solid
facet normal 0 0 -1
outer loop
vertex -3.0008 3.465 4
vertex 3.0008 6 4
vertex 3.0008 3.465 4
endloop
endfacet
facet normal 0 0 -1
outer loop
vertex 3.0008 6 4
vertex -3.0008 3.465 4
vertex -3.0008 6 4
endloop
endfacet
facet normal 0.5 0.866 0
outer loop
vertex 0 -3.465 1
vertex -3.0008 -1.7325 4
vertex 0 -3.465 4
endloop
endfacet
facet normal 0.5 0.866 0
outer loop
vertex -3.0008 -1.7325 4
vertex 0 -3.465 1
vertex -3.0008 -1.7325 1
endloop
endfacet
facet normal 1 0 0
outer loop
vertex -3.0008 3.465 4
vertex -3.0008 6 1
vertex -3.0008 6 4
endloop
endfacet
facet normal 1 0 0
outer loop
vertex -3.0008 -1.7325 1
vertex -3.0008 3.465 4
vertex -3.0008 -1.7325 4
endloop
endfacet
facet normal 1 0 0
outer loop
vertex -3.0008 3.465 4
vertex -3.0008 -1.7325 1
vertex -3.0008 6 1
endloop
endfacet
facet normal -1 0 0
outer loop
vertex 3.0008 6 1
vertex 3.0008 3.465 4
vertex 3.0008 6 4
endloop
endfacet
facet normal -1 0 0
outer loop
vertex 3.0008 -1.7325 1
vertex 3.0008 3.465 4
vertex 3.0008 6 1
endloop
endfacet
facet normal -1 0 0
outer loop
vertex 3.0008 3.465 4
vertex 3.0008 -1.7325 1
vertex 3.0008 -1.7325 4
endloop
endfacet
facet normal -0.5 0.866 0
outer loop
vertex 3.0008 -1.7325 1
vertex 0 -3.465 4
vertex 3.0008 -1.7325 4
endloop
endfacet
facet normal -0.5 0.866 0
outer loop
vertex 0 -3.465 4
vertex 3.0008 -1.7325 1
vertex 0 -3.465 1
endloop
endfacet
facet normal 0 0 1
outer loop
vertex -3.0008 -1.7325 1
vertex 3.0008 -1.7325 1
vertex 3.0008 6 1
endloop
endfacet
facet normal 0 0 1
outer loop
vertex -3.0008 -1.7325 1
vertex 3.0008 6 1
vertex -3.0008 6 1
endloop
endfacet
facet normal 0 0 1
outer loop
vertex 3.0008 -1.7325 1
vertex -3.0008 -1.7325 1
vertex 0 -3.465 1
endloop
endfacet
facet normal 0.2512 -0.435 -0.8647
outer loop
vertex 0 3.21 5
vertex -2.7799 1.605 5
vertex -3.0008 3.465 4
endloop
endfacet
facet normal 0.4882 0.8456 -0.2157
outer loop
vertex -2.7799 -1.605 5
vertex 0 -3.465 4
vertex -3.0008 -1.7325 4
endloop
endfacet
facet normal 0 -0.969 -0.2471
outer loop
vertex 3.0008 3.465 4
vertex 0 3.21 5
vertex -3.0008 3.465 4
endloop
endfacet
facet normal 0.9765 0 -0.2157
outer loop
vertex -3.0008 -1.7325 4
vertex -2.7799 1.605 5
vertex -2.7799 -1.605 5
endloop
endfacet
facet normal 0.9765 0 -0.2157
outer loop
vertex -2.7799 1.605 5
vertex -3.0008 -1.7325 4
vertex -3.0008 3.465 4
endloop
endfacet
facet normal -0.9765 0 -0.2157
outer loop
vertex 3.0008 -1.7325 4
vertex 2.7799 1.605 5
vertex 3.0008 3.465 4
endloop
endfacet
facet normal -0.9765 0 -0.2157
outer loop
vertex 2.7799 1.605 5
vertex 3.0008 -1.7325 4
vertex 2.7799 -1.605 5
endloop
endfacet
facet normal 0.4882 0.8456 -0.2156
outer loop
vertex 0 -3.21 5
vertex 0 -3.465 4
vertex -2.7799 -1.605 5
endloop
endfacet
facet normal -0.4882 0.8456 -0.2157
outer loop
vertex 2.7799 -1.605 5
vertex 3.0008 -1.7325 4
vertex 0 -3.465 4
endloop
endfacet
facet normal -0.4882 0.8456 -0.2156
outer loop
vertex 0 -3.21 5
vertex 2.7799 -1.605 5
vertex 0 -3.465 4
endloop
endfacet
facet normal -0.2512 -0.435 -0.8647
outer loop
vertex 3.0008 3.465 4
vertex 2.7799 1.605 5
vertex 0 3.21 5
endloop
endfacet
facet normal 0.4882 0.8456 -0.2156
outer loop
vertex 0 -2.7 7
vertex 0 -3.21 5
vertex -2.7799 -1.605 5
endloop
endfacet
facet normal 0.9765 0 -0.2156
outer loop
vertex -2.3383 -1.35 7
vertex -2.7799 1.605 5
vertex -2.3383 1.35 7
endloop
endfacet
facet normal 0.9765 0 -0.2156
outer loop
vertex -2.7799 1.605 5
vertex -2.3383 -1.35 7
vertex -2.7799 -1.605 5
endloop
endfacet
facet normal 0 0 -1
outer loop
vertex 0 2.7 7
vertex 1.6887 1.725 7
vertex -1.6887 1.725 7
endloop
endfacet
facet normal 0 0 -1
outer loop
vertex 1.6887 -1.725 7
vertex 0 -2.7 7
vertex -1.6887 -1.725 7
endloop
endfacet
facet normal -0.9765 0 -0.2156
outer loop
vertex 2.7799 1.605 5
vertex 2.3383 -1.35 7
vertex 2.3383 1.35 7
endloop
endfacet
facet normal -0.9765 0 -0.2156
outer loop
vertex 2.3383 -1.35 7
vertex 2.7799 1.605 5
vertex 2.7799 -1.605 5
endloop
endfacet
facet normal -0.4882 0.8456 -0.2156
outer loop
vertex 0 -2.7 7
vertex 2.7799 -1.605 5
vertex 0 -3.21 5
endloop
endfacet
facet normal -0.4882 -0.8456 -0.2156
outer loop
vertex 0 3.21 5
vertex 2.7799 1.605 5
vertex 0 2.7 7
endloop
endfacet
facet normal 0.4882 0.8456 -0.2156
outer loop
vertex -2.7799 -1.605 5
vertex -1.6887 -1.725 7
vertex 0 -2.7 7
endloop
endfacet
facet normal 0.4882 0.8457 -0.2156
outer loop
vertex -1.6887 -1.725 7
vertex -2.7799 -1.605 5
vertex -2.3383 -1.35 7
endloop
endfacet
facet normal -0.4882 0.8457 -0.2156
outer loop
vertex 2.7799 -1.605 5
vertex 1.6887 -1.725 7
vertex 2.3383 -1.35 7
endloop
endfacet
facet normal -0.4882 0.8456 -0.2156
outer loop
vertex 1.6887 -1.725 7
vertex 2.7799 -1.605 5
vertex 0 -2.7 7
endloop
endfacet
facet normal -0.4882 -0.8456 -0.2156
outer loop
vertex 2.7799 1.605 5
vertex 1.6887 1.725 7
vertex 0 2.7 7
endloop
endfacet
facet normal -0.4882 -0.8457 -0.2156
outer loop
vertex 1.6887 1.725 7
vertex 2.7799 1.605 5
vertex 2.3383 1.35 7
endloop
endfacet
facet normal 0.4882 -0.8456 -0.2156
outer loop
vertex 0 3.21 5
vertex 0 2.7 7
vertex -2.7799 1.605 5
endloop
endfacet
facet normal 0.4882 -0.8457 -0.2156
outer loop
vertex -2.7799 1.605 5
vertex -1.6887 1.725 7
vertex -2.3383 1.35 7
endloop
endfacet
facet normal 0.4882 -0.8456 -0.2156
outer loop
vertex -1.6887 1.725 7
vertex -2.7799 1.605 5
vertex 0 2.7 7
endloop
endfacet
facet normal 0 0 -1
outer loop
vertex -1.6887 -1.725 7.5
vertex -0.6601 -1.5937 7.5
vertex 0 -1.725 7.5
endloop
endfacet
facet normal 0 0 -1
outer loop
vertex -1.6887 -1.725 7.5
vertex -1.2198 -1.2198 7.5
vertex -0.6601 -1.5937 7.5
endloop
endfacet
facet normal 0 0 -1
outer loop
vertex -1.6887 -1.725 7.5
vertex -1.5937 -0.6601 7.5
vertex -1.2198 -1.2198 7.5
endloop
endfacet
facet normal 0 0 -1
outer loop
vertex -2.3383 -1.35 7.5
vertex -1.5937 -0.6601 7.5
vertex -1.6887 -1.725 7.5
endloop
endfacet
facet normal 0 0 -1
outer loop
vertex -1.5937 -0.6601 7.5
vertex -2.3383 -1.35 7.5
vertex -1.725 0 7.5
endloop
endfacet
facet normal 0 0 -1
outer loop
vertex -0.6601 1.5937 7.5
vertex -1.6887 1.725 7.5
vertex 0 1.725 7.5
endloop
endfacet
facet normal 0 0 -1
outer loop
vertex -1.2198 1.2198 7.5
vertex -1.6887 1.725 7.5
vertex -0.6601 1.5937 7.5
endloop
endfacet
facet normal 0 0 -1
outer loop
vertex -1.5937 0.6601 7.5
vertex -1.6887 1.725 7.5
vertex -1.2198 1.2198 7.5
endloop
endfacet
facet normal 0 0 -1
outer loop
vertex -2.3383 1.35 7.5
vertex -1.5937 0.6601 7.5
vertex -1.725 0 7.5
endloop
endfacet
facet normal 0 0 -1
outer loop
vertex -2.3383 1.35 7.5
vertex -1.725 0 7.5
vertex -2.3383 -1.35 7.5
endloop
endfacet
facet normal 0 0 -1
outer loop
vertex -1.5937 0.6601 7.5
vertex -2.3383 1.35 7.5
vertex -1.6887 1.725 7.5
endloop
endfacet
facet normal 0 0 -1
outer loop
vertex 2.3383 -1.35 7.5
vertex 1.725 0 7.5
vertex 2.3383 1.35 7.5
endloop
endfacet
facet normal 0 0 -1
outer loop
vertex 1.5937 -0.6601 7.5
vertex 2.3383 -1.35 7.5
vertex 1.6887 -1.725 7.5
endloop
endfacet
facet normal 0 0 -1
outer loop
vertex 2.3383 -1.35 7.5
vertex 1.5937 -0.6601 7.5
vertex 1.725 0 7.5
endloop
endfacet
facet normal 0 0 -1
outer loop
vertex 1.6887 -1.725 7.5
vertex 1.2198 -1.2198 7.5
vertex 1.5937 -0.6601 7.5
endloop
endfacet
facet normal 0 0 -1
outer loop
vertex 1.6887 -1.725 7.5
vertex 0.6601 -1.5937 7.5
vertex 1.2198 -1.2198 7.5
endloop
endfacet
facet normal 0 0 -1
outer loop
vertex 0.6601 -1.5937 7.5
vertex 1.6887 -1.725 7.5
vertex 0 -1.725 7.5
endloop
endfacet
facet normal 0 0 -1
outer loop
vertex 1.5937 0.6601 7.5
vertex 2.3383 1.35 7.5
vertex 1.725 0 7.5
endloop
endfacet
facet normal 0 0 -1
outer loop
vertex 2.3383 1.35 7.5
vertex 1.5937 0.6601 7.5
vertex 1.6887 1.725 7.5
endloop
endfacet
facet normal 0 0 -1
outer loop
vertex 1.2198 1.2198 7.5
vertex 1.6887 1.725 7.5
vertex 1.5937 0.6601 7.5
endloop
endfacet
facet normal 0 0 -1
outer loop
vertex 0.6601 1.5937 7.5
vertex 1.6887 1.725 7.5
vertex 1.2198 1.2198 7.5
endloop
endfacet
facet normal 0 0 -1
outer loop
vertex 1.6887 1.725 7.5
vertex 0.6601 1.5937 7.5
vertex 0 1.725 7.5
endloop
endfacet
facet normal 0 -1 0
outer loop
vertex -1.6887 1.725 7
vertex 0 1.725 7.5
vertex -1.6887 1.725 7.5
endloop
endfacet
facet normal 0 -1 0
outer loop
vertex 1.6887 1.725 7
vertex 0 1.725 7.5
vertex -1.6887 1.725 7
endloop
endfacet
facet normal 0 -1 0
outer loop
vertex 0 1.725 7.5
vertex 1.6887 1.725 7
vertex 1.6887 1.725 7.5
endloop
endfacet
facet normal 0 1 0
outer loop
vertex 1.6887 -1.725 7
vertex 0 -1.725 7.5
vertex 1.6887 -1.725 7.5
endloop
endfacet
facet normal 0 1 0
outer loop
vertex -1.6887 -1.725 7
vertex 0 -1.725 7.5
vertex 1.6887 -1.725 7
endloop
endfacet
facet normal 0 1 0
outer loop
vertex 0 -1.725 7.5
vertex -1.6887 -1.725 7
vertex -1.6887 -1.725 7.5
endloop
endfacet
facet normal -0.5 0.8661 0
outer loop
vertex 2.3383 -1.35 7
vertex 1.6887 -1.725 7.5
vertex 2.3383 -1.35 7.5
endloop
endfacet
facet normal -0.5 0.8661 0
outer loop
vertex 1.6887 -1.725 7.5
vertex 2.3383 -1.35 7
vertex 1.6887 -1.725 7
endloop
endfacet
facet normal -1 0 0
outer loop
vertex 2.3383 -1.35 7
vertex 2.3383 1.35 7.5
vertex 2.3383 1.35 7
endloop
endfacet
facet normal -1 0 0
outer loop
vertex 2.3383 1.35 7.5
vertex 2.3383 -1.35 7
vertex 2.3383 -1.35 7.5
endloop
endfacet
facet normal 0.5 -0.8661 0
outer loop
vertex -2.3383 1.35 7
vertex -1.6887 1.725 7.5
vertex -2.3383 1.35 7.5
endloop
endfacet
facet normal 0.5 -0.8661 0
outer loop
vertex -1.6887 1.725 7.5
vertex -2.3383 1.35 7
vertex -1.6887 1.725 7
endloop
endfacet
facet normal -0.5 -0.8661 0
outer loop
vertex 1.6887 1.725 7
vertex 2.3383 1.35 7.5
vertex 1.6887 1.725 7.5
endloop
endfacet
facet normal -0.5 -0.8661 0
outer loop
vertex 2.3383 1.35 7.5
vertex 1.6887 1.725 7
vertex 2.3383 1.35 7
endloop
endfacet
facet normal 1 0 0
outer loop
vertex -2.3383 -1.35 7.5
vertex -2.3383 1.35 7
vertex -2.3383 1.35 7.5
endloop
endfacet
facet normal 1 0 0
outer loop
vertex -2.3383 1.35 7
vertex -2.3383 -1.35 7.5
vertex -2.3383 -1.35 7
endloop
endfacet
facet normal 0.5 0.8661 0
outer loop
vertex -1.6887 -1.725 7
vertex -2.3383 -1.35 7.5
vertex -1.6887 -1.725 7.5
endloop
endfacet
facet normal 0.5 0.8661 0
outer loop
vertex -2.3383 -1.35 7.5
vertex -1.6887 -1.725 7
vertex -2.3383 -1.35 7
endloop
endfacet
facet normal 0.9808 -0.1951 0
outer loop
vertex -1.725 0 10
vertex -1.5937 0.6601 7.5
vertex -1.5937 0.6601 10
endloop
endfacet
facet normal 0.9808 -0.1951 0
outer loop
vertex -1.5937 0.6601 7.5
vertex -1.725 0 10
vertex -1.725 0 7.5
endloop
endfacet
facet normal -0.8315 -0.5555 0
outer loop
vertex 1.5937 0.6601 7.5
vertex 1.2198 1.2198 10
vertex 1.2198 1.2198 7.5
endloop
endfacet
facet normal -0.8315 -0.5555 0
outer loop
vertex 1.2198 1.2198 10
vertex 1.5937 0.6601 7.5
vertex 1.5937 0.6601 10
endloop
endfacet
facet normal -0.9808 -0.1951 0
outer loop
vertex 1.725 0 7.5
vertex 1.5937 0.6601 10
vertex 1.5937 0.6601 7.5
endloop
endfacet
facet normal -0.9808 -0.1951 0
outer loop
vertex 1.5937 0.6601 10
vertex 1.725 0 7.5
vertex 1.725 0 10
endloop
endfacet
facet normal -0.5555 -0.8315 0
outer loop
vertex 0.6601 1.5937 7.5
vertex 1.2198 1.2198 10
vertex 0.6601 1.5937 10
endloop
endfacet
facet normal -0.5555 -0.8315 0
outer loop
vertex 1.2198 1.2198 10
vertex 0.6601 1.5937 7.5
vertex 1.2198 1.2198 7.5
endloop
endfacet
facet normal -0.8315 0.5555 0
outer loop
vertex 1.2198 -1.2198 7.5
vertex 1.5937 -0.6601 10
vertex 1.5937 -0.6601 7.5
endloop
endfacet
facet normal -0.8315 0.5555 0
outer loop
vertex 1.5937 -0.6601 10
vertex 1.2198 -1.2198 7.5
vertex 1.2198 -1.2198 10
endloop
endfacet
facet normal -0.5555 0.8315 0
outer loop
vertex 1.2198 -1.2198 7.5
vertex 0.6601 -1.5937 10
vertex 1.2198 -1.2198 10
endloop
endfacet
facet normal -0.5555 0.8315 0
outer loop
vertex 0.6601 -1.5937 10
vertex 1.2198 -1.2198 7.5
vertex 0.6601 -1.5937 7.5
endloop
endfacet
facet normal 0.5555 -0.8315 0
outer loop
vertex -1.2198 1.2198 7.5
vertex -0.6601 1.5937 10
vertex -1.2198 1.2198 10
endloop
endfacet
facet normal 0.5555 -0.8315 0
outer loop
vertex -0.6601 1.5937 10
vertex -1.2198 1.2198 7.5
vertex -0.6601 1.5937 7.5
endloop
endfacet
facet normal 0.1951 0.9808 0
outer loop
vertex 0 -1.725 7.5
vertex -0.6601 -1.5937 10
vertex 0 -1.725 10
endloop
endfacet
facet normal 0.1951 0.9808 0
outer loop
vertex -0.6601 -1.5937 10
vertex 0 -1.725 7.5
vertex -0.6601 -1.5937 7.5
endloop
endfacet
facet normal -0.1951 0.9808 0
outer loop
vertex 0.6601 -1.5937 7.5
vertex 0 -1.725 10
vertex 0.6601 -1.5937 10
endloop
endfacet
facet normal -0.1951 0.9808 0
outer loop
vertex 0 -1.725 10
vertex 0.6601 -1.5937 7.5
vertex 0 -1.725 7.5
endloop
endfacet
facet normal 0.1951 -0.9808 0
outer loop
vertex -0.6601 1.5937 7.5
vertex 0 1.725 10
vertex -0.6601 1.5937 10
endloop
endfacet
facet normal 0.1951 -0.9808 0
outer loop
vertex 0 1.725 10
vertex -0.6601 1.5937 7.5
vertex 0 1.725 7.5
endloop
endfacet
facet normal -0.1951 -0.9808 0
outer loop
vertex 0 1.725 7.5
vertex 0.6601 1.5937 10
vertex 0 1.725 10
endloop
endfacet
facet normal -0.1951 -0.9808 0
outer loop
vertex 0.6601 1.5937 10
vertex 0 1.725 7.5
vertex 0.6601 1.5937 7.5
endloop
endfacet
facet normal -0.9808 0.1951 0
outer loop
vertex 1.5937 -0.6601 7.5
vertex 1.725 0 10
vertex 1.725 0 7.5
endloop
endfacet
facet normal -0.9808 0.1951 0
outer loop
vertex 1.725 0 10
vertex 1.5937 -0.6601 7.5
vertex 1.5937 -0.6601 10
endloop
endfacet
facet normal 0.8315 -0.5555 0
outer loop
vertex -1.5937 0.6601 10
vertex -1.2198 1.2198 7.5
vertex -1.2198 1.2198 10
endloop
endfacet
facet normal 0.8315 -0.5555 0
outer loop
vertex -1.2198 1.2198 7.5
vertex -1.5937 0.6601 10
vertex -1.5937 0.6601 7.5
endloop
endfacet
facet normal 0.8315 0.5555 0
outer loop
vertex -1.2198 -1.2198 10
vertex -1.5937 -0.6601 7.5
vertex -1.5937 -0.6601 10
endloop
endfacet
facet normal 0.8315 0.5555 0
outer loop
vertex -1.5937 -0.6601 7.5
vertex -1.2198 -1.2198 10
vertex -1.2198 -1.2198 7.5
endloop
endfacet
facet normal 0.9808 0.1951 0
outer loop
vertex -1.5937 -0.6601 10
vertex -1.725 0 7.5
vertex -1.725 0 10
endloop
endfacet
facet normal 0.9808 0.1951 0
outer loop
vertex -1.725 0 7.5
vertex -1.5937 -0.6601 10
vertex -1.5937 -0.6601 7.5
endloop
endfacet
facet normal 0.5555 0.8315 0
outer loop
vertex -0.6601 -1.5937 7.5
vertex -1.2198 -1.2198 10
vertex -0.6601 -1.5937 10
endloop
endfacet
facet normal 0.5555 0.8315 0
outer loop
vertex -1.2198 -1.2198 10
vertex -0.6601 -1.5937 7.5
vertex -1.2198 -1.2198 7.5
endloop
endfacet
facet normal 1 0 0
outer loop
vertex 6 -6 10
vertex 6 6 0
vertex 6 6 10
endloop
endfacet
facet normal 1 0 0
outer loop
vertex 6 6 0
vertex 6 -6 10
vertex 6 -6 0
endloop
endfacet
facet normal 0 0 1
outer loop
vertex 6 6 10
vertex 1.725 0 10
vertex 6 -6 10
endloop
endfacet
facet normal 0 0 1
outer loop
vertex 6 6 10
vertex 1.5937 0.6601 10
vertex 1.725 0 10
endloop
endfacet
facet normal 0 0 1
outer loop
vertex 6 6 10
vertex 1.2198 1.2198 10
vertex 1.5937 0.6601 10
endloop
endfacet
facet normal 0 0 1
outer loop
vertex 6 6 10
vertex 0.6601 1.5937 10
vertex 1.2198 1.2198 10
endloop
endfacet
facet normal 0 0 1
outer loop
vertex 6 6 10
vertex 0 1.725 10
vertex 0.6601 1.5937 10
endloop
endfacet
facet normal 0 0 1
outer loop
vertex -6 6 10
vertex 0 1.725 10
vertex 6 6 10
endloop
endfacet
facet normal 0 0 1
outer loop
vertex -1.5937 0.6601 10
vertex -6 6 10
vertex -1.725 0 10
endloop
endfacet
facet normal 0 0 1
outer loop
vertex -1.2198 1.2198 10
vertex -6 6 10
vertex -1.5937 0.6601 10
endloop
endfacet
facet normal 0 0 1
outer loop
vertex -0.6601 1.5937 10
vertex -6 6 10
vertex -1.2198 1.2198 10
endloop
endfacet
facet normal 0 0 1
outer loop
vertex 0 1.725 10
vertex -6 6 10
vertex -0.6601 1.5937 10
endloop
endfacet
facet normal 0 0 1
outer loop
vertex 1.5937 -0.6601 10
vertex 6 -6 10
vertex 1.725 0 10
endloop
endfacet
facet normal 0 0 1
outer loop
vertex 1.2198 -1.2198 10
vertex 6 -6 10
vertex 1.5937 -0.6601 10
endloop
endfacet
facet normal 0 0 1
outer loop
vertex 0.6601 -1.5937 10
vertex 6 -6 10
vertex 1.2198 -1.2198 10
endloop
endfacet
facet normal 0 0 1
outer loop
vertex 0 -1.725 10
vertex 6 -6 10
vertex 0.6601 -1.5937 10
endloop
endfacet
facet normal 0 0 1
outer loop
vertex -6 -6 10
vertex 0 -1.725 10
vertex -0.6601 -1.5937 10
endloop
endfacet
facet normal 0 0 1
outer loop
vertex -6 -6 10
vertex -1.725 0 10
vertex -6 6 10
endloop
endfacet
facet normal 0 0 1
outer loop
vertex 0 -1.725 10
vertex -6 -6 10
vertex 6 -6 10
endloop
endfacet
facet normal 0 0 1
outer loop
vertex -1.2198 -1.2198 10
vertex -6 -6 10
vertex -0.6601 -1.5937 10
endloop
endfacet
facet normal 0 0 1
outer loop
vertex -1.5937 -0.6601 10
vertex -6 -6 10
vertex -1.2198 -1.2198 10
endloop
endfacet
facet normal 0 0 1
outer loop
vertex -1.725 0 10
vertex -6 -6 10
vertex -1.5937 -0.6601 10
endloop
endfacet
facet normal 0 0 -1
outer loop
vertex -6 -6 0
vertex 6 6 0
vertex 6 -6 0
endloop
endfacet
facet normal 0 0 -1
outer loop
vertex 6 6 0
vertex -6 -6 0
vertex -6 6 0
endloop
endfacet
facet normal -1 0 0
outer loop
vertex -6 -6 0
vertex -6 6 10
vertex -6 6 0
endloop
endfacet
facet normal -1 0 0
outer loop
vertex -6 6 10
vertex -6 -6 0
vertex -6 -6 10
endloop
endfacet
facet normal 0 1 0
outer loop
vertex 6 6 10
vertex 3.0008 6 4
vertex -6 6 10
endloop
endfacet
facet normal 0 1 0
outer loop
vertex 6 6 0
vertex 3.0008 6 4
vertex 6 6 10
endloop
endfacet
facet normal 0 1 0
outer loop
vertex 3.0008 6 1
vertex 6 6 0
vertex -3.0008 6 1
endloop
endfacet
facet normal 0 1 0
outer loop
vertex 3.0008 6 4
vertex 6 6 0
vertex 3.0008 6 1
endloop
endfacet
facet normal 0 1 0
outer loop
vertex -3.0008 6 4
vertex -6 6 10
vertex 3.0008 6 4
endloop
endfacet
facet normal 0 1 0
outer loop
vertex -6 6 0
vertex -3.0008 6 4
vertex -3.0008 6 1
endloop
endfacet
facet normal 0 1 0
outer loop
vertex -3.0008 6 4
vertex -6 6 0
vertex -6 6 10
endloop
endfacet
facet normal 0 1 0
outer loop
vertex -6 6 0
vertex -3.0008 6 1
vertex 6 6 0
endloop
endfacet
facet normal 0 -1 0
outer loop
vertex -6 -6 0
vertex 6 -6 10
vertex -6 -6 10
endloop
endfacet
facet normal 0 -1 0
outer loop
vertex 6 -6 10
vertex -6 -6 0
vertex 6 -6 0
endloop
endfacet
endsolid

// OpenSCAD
// file: microscope_parameters.scad
/******************************************************************
*                                                                 *
* OpenFlexure Microscope: Microscope Parameters                   *
*                                                                 *
* This is the top-level configuration file for the OpenFlexure    *
* microscope, an open microscope and 3-axis translation stage.    *
* It gets really good precision over a ~10mm range, by using      *
* plastic flexure mechanisms.                                     *
*                                                                 *
* Generally I've tried to put parts (or collections of closely    *
* related parts) in their own files.  However, all the parts      *
* depend on the geometry of the microscope - so these parameters  *
* are gathered together here.  In general, the ones you might     *
* to change are towards the top!  Lower-down ones are defined in  *
* terms of higher-up ones - confusion might arise if you redefine *
* these later...                                                  *
*                                                                 *
* (c) Richard Bowman, January 2016                                *
* Released under the CERN Open Hardware License                   *
*                                                                 *
* http://www.github.com/rwb27/openflexure_microscope              *
* http://www.docubricks.com/projects/openflexure-microscope       *
* http://www.waterscope.org                                       *
*                                                                 *
******************************************************************/

// this is a tiny distance. Used to be a parameter d in the code but that caused confusion with diameters
function tiny() = 0.05;
$fn=32;

// These are the most useful parameters to change!
motor_lugs = true;
version_numstring = "6.1.3";
camera = "picamera_2"; //see cameras/camera.scad for valid values
optics = "rms_f50d13"; //see optics.scad for valid values
led_r = 4.5/2; //size of the LED used for illumination
endstops = false; //whether to build mounts for optical endstops inside the microscope.
feet_endstops = false; //whether to include cut-outs for endstop switches in the feet.
beamsplitter = true; //enables a cut-out in some optics modules for a beamsplitter
smart_brim_r = 5;
enable_smart_brim = true;

// This sets the basic geometry of the microscope
sample_z = 75; // z position of sample
leg_height = sample_z-10; // height of the top of the leg. Shorter by 10 to give space to insert nuts.

leg_r = 30; // radius on which the innermost part of legs sit. (This sets the stage size)
hole_r = 20; // size of hole in the stage
xy_lever_ratio = 4.0/7.0; // mechanical advantage of actuator over stage - can be used to trade speed and precision
z_lever_ratio = 1.0; // as above, for Z axis (must be >1)

// The variables below affect the position of the objective mount
z_strut_l = 18; //length of struts supporting Z carriage
objective_mount_y = 18; // y position of clip for optics
objective_mount_nose_w = 6; // width of the pointy end of the mount
condenser_clip_w = 14; // width of the dovetail clip for the condenser
foot_height=15;

// This variables set the dimensions of flexures.
// It is well tested with PLA.

function flex_dims() = let
(
    flex_w = 4, // width  of flexures
    flex_l = 1.5,    // length of flexures
    flex_t = 0.75// thickness  of flexures
)  [flex_w, flex_l, flex_t];

flex_a = 0.15;    // sin(8.62 deg) => sine of the angle through which flexures can be bent

// Compile a sensible version string
version_string = str("v",version_numstring, sample_z, motor_lugs?"-M":"");
echo(str("Compiling OpenFlexure Microscope ",version_string));


leg_block_t = 5; // Thickness of the block at the top and bottom of the leg
stage_t = sample_z-leg_height + leg_block_t; //thickness of the XY stage (at thickest point, most is 1mm less)
stage_hole_inset = flex_dims().y+4; // how far the holes on the XY stage are inset from leg_r
flex_z1 = 0;      // z position of lower flexures for XY axis
flex_z2 = leg_height-leg_block_t; //height of upper XY flexures
z_strut_t = 6;  // (z) thickness of struts for Z axis
function leg_dims() = [4,flex_dims().x,flex_z2+flex_dims().z]; // size of vertical legs
leg_middle_w = 12; // width of the middle part of each leg
actuator_h = 25; //height of the actuator columns
dz = 0.5; //small increment in Z (~ 2 layers)

leg_outer_w = leg_middle_w + 2*flex_dims().y + 2*leg_dims().x; // overall width of parallelogram legs that support the stage
actuator = [3*1.2+2*2,(flex_z2 - flex_z1)*xy_lever_ratio,6]; // dimensions of the core part of the actuating levers for X and Y - NB should match the column_base_r in compact_nut_seat.scad
actuating_nut_r = (flex_z2 - flex_z1)*xy_lever_ratio; // distance from leg_r to the actuating nut/screw for the XY axes
xy_actuator_travel = actuating_nut_r*0.15; // distance moved by XY axis actuators

// Z axis
z_flexures_z1 = 8; // height of the lower flexure on z actuator
z_flexures_z2 = min(leg_height - 12, 35); // height of the upper flexure on z actuator
objective_mount_back_y = objective_mount_y + 2; //back of objective mount
z_anchor_y = objective_mount_back_y + z_strut_l + 2*flex_dims().y; // fixed end of the flexure-hinged lever that actuates the Z axis
z_anchor_w = 20; //width of the Z anchor
zll = (z_strut_l + flex_dims().y)*z_lever_ratio; //required actuator lever length
zfz = z_flexures_z1; // shorthand for the next line only!
z_nut_y = z_anchor_y - flex_dims().y/2 + sqrt(zll*zll - zfz*zfz);
z_actuator_travel = zll*0.15; // distance moved by the Z actuator
z_actuator_tilt = -asin(z_flexures_z1/zll); //angle of the Z actuator

z_flexure_x = (leg_r-flex_dims().y-max(5,leg_dims().z*0.1))*sqrt(2); // x position of the outside of the Z-axis static anchors (either side of the XY stage, on the X axis) (no longer used by Z axis but still in use elsewhere.)

leg_link_spacing = 10;
base_t=1; // thickness of the flat base of the structure
wall_h=15; // height of the stiffening vertical(ish) walls
wall_t=2; //thickness of the stiffening walls
zawall_h = z_flexures_z2 - 10; //height of wall near Z anchor
zbwall_h = z_flexures_z2 - 10; //height of bridge over Z lever

illumination_dovetail_screws = [[20,z_nut_y,leg_height-2],[-20,z_nut_y,leg_height-2],
                           [0,(leg_r + leg_outer_w)/sqrt(2) + 4,leg_height-2]];
                      // positions of screws that mount the adjustable version of the
                      // illumination arm
condenser_clip_y = -8; //position of dovetail for old condenser assembly TODO: rename this


// base_mounting_holes returns a list of the holes for mounting the microscope
// to the base. By default it returns all four holes.
// To get only the lugs run `base_mounting_holes("lugs")`
// To get only the front holes run `base_mounting_holes("front")`
function base_mounting_holes(type="all") = let
(
    lug_pos = [[z_flexure_x+4,-8,0],
               [-z_flexure_x-4,-8,0]],
    front_pos =[[-20,z_nut_y-4,0],
                [20,z_nut_y-4,0]],
    lugs = (type == "lugs") || (type == "all"),
    front = (type == "front") || (type == "all"),
    //Set which holse to output
    holes = [lugs?lug_pos:[], front?front_pos:[]]
    //Final list comprehension make a single list of holes
) [for (h = holes) each h];

endstop_extra_ringheight=feet_endstops?1:0;
endstop_hole_offset=0;
//this is a temporary option to printfeet with smaller travel
//without this with 15mm hole the stage hits the objective
//the stage can move ~3mm in each direction, so the actuator only moves
//~1.7 mm
avoid_objective_xyfoot_offset=xy_actuator_travel-1.8;

fl_cube_w = 16; //width of the fluorescence filter cube

tall_bucket_base = false; //If true creates a taller bucket base for the infinity corrected optics.
// main file
//Simple test object to test the nut trap prints correctly

use <compact_nut_seat.scad>
include <microscope_parameters.scad>
use <utilities.scad>


c_h = 10;
difference()
{
    translate([0,0,c_h/2])cube([12,12,c_h], center=true);
    m3_nut_trap_with_shaft(0,0);
}
